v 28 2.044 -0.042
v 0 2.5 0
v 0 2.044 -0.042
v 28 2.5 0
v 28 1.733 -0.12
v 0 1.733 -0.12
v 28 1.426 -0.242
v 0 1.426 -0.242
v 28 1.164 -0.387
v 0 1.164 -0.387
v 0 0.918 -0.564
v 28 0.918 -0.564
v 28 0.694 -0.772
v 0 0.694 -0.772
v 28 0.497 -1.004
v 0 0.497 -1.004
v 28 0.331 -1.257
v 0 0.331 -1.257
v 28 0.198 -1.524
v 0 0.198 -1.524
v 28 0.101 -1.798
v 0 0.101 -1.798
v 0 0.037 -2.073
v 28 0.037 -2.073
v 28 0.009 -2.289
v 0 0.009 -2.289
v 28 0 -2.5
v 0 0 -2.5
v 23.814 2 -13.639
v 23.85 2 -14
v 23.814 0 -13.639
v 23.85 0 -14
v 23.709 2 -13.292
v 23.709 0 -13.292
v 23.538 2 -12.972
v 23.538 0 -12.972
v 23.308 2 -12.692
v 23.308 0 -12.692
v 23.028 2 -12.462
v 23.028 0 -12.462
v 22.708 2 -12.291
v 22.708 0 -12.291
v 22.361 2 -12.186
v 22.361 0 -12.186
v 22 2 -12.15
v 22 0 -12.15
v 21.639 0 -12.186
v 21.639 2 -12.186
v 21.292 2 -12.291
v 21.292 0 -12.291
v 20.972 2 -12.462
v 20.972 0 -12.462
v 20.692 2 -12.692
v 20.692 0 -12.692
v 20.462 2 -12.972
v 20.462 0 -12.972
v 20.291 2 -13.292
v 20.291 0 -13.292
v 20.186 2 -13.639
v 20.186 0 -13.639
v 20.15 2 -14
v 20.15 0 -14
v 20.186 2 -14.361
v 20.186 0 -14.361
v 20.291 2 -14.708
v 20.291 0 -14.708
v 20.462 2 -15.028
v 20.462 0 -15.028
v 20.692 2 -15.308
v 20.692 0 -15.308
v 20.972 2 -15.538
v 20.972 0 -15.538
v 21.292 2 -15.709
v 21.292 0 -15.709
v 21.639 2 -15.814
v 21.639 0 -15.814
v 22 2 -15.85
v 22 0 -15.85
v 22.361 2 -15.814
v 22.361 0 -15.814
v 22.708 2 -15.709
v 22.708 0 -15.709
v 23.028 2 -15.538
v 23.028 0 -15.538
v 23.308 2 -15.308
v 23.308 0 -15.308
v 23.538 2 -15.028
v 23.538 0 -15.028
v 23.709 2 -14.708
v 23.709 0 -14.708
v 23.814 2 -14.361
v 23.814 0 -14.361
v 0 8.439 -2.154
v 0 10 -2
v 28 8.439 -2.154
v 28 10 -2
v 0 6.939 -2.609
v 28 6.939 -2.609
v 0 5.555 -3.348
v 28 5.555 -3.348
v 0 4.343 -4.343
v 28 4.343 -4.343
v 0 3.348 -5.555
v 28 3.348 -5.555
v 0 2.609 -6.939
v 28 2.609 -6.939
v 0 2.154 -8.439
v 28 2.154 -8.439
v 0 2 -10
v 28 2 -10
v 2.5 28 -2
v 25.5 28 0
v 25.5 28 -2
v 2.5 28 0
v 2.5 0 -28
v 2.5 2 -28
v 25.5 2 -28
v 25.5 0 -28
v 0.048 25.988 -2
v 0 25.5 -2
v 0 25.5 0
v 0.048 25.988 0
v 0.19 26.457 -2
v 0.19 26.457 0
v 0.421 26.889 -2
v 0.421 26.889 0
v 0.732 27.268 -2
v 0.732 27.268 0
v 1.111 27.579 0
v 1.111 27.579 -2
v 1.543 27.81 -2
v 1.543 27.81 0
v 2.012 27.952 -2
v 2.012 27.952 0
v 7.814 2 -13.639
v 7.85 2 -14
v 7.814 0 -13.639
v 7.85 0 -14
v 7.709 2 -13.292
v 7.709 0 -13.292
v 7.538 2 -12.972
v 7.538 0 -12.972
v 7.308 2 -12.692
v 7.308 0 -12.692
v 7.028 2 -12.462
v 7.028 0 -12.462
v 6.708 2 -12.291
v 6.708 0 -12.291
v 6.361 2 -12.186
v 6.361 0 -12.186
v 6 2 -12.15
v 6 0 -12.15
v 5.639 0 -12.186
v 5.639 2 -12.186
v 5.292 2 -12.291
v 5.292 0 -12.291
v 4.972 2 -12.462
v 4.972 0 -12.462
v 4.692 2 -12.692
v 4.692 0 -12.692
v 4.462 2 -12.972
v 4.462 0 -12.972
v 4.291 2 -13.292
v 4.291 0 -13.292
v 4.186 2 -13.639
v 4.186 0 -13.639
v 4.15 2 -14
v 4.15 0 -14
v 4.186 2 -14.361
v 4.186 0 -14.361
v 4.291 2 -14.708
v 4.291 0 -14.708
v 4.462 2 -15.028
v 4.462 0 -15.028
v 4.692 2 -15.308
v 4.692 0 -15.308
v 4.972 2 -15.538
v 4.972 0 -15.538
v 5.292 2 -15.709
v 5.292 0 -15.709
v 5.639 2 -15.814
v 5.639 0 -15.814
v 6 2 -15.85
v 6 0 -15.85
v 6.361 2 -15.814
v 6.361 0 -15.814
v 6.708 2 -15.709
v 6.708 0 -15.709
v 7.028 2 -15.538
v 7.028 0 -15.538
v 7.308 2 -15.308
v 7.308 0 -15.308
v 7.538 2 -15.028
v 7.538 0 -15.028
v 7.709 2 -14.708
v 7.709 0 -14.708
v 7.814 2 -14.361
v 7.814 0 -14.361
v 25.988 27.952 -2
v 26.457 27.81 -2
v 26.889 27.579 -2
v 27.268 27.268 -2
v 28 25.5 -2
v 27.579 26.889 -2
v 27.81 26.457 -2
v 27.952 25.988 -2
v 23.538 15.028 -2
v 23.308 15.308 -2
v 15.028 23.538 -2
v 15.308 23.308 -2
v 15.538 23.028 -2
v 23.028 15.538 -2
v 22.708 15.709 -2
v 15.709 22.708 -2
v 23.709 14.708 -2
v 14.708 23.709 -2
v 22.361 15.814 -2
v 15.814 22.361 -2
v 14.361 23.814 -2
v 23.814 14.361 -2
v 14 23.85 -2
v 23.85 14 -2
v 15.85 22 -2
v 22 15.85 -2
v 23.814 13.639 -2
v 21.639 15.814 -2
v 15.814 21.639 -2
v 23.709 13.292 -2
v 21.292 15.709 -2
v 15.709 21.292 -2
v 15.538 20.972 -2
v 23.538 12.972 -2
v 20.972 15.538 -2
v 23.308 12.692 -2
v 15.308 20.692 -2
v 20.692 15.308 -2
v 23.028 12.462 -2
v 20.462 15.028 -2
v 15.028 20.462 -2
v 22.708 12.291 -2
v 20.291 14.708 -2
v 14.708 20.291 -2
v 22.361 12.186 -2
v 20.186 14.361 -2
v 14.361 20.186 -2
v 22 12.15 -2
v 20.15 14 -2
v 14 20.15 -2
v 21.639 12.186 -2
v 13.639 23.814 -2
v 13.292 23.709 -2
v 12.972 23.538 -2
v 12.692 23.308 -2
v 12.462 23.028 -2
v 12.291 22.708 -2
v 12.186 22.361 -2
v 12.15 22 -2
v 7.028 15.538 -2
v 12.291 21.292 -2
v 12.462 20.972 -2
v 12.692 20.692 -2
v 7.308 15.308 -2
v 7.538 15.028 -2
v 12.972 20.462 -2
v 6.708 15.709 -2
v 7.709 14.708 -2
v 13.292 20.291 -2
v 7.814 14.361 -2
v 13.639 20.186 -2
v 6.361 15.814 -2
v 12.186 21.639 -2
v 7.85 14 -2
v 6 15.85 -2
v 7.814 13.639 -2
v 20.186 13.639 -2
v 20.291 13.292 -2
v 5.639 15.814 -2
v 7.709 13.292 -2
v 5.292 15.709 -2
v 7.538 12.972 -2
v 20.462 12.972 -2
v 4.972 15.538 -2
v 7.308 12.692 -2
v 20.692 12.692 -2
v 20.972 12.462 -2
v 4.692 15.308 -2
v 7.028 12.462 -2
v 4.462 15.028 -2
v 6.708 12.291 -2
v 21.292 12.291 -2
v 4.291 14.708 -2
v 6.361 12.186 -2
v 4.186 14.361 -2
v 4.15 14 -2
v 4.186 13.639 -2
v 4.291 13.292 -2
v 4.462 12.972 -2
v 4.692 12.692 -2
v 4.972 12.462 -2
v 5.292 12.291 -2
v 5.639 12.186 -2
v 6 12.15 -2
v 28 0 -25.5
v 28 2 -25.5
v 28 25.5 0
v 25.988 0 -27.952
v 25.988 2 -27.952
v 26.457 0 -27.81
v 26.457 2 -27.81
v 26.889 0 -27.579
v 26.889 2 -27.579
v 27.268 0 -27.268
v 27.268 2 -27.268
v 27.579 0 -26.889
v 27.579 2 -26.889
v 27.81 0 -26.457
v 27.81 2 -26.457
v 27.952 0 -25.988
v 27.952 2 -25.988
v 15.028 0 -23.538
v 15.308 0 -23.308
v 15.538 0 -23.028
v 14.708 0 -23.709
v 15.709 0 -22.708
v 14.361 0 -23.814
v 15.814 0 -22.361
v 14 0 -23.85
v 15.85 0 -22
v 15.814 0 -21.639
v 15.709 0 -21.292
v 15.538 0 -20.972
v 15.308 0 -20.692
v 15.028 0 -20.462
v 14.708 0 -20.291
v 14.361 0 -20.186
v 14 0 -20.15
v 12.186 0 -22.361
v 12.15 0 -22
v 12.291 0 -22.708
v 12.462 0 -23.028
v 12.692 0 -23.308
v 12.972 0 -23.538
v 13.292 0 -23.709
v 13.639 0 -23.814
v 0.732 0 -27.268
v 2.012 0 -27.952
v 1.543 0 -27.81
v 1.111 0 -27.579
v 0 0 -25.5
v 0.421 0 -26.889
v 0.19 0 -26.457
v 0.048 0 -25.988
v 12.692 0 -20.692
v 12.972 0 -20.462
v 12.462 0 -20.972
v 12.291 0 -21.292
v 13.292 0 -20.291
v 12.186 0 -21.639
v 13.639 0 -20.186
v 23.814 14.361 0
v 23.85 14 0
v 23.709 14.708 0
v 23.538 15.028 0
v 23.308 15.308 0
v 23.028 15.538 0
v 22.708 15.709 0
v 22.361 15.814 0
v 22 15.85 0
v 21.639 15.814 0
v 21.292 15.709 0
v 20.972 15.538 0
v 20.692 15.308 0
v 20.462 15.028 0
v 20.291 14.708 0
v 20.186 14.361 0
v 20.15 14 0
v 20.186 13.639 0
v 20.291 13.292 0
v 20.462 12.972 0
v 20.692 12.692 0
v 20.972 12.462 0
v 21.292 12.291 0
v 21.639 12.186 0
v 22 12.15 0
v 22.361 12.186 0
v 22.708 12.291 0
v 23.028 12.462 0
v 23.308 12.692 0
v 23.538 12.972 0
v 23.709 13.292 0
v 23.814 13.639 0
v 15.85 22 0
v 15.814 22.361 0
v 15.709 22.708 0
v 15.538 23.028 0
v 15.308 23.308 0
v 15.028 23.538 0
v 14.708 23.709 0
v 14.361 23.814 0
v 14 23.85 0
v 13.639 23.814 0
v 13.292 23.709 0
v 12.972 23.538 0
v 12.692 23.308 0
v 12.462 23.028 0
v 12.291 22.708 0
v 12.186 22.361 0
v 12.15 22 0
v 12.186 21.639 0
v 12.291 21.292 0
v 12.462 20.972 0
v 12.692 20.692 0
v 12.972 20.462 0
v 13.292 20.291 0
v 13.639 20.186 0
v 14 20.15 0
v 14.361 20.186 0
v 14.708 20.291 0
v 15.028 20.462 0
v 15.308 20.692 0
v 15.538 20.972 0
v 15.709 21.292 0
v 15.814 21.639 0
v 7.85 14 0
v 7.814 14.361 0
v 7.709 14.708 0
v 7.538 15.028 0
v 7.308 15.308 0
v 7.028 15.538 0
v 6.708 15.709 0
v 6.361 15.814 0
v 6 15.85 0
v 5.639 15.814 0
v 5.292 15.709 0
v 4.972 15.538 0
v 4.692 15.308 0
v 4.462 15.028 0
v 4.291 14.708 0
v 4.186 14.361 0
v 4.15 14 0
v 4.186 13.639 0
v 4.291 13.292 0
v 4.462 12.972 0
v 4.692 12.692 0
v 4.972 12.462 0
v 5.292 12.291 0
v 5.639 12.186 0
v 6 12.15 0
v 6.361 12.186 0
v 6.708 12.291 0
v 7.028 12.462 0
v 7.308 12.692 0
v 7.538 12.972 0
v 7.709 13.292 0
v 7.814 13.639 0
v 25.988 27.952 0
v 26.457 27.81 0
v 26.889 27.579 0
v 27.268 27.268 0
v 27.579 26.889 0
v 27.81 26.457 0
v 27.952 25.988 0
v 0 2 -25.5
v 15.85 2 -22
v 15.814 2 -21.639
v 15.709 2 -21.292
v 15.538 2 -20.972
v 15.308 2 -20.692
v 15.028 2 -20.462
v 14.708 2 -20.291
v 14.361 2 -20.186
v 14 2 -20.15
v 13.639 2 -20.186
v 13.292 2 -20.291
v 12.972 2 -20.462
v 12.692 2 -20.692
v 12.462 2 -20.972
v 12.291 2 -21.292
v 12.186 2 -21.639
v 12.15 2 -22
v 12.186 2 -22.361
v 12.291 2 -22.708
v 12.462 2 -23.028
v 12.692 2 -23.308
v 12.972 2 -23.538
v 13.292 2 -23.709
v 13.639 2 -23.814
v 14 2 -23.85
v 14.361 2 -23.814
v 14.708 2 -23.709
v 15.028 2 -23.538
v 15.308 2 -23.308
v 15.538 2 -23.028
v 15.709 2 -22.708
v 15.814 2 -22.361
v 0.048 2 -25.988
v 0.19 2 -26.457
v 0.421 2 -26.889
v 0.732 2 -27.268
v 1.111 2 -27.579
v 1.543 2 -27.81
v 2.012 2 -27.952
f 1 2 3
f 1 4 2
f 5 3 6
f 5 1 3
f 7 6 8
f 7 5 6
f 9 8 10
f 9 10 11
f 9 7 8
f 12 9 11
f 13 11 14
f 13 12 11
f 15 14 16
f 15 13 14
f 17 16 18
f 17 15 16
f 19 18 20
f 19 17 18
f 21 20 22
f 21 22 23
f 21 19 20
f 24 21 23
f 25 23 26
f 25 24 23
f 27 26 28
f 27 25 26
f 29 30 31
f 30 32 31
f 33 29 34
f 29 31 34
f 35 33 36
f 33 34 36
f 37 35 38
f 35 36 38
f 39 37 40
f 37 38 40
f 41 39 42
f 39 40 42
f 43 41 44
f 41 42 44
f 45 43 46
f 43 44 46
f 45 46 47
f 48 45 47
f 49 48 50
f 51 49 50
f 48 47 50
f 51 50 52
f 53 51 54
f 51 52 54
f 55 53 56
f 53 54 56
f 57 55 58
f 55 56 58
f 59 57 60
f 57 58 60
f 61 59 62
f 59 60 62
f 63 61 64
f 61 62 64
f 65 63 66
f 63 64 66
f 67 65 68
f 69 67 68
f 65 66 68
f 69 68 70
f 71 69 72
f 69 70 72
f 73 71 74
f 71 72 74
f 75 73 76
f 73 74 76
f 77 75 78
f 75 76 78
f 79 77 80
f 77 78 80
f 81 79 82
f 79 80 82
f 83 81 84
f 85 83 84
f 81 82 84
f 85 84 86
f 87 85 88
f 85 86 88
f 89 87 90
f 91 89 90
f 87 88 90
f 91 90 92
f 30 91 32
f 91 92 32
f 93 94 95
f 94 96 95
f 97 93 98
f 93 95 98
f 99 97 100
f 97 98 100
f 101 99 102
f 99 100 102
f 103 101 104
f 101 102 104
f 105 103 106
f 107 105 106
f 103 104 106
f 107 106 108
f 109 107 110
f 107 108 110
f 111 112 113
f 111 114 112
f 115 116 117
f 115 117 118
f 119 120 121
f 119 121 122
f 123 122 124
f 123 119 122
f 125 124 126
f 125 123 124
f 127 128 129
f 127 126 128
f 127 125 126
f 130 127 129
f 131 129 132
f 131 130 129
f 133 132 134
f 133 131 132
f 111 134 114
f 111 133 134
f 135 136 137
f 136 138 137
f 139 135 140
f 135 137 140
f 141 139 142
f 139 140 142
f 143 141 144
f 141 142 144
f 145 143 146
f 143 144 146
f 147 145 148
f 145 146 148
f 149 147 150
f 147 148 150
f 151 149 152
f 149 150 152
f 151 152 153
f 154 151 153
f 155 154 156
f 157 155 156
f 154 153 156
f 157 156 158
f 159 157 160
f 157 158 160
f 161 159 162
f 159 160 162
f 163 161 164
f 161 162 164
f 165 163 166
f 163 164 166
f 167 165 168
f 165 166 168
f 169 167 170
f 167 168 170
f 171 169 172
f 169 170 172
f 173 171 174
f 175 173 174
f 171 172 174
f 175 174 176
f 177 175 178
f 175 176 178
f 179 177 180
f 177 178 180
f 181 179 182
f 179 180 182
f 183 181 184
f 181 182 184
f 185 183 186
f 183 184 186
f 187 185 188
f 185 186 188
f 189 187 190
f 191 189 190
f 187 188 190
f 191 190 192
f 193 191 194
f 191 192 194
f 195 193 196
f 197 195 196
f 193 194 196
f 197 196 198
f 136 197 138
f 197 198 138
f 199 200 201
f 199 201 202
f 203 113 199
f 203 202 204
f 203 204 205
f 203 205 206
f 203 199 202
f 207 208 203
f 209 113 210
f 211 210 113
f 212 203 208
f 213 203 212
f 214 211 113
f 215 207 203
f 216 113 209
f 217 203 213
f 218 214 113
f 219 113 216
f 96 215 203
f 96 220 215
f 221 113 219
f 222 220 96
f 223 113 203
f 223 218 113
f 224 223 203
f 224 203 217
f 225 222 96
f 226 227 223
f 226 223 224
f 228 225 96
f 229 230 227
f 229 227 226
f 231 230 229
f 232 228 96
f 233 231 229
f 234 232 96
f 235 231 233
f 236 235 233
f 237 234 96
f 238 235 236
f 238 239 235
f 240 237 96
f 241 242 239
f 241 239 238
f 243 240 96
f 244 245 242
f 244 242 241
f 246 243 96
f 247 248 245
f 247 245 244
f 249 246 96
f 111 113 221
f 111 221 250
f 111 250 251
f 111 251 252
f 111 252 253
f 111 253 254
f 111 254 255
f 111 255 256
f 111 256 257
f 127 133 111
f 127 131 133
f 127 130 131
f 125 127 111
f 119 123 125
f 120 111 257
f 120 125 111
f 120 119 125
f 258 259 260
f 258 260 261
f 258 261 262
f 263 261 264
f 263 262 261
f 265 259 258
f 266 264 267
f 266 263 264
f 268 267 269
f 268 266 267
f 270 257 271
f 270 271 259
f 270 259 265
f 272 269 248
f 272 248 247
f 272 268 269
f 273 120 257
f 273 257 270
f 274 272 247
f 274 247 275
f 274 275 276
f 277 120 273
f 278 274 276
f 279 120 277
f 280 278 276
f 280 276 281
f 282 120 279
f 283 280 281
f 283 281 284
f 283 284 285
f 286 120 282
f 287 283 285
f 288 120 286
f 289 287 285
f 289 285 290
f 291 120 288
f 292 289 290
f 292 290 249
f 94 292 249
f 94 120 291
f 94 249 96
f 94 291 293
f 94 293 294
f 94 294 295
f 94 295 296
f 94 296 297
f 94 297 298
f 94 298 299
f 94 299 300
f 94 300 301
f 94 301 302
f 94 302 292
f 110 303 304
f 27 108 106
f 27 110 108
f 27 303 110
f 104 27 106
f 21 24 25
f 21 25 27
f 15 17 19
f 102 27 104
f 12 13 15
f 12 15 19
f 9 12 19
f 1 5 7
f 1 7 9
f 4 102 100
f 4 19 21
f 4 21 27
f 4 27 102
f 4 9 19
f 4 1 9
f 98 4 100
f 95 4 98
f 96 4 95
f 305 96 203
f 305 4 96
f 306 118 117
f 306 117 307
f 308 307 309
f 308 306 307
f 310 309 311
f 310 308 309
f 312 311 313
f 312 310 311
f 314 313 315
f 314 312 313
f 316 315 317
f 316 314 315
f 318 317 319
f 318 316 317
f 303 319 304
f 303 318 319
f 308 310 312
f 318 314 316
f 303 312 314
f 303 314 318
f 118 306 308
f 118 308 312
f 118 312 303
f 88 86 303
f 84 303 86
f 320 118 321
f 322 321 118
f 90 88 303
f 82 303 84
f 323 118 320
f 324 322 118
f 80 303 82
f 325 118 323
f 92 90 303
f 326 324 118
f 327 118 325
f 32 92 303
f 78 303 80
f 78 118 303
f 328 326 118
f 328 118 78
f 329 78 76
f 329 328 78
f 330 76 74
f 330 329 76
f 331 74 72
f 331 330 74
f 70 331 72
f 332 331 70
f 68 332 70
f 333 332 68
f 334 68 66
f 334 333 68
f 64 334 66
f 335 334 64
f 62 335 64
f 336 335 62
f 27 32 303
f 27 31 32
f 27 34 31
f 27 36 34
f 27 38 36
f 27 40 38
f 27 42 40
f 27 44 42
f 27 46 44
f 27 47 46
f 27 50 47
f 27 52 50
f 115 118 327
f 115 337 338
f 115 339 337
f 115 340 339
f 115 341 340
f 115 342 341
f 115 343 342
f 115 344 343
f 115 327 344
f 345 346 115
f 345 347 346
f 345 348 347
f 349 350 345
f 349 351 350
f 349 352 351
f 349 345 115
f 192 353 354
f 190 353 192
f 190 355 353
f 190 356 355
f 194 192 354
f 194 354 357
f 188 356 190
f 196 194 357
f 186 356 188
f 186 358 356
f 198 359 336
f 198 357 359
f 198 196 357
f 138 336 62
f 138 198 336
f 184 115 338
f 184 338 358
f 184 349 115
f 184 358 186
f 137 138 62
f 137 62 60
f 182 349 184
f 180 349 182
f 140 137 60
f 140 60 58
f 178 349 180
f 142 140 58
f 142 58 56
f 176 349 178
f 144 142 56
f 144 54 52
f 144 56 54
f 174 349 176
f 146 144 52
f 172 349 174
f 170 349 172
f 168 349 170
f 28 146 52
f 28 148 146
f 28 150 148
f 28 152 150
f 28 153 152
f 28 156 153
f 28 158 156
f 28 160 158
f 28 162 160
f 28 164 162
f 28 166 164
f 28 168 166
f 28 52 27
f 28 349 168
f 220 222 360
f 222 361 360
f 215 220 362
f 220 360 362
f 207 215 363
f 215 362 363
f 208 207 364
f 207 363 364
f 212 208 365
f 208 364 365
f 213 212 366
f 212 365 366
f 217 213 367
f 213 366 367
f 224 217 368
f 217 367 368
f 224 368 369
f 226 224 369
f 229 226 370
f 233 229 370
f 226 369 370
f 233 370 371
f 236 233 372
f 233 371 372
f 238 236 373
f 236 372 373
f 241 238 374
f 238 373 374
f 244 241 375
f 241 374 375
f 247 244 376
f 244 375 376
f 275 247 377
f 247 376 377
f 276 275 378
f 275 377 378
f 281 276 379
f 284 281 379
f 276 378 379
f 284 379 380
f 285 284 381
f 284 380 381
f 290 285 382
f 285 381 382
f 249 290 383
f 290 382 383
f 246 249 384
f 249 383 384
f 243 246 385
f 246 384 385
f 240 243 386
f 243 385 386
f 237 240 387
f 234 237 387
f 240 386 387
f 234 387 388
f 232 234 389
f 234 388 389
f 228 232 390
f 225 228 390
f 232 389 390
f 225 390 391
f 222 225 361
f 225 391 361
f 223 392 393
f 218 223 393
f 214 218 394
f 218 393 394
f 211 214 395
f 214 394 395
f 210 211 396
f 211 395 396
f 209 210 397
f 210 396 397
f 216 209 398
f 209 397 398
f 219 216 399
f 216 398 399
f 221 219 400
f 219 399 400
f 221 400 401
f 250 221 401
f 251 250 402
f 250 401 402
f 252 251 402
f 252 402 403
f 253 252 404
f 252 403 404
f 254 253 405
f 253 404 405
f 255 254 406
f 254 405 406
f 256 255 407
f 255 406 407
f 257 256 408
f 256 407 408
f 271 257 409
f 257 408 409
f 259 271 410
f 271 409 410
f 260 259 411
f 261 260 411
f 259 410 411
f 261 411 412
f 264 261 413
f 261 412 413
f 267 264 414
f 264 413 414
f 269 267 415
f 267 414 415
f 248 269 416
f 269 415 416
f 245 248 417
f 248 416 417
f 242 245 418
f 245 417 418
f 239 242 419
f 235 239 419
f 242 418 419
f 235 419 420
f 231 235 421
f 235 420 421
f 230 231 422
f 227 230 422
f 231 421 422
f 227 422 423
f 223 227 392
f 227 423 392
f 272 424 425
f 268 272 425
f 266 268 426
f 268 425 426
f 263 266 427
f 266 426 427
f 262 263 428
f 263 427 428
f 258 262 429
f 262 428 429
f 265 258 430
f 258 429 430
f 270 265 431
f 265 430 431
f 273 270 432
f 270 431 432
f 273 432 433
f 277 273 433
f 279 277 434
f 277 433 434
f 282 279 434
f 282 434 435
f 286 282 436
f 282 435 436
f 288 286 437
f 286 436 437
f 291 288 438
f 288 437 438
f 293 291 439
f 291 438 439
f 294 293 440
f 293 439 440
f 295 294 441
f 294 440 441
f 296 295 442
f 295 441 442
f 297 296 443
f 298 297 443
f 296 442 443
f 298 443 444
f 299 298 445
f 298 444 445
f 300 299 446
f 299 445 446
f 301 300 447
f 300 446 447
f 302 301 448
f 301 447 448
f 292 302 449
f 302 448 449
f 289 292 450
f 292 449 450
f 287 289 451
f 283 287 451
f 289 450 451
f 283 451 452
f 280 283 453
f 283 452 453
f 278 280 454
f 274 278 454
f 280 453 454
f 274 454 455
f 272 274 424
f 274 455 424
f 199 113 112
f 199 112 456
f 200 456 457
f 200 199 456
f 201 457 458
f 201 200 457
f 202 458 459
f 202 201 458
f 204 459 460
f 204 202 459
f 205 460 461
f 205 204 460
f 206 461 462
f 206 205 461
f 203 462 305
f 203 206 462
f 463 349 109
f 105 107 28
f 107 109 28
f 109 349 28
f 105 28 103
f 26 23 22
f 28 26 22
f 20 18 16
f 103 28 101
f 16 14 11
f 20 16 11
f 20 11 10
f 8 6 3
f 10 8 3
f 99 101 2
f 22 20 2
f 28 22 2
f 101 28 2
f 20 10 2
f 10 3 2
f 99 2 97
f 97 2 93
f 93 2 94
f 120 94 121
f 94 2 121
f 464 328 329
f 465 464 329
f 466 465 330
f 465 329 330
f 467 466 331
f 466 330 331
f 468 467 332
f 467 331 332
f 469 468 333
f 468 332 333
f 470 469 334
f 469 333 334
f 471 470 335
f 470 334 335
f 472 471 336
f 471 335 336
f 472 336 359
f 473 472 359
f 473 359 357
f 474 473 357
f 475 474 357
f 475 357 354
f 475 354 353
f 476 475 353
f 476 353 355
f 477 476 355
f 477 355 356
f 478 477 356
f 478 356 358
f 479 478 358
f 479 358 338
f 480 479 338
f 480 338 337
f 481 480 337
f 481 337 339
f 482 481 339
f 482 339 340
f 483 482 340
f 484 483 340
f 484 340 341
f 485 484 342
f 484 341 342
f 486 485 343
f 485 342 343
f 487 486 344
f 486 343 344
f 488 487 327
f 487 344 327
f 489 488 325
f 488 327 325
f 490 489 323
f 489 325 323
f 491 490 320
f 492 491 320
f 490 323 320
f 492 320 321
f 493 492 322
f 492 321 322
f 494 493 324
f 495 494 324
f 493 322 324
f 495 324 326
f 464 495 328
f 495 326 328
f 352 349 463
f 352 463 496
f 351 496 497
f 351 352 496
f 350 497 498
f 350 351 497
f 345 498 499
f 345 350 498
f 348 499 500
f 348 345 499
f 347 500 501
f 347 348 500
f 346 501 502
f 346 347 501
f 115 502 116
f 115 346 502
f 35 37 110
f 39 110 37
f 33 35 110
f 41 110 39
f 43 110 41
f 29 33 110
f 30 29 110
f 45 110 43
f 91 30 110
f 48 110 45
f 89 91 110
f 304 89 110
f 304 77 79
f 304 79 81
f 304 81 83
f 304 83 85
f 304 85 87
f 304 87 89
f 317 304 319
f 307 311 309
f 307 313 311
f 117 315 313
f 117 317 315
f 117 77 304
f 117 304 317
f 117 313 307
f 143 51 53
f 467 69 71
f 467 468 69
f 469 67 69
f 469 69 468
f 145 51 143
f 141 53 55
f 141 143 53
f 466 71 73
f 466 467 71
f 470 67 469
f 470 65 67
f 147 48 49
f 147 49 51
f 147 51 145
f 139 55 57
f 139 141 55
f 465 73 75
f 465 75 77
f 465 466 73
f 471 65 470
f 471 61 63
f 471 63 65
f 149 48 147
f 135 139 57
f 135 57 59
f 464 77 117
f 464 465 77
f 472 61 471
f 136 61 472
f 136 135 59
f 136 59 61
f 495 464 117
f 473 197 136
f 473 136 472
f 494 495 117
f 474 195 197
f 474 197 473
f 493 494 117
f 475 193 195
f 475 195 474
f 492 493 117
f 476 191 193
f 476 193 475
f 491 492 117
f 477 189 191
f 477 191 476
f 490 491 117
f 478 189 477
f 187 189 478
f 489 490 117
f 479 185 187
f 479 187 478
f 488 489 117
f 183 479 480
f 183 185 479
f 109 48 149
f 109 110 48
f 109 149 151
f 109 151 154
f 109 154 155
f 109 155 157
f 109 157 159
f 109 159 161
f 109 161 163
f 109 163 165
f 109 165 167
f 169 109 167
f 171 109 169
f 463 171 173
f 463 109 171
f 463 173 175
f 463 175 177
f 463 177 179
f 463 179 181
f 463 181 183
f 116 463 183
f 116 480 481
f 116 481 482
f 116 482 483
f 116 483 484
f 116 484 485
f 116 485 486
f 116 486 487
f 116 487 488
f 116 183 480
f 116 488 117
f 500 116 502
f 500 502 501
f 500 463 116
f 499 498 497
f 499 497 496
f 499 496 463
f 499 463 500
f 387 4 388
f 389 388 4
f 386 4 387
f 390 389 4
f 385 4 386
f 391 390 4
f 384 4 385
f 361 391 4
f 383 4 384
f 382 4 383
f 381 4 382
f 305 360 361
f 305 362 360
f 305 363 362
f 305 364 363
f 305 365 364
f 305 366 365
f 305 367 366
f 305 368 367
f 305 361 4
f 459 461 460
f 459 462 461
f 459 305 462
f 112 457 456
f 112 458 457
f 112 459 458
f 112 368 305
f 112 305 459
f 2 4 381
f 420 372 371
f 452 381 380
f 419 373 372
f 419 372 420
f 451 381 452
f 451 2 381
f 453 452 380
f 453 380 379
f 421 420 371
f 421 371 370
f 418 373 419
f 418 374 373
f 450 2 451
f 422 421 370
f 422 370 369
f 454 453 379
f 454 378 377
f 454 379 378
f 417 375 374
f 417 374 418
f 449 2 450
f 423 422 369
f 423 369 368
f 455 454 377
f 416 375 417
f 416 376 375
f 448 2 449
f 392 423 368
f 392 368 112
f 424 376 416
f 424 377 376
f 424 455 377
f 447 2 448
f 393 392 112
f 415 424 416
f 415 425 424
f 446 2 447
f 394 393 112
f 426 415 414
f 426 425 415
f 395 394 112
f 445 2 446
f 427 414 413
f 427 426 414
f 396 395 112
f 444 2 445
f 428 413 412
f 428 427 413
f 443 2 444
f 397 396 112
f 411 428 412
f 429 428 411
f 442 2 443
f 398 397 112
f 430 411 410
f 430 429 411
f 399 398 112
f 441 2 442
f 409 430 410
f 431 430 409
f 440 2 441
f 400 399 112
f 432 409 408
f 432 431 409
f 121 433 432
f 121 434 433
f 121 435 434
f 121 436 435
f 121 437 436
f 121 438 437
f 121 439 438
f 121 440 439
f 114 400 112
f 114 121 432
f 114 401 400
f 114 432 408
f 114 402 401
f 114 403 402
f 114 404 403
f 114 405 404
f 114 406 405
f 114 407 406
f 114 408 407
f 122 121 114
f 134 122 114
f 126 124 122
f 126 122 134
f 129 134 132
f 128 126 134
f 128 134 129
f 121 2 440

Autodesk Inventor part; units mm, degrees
ref_plane "YZ Plane" through (0, 0, 0) normal (1, 0, 0) x (0, 1, 0)
ref_plane "XZ Plane" through (0, 0, 0) normal (0, 1, 0) x (-1, 0, 0)
ref_plane "XY Plane" through (0, 0, 0) normal (0, 0, 1) x (1, 0, 0)
sketch "Sketch1" plane through (0, 0, 0) normal (1, 0, 0) x (0, 1, 0)
  line L0 (0, 0) -> (28, 0)
  line L1 (28, 0) -> (28, -2)
  line L2 (0, -2) -> (0, 0)
  line L3 (0, 0) -> (2, 0)
  line L4 (2, -28) -> (0, -28)
  line L5 (0, -28) -> (0, 0)
  line L6 (28, -2) -> (2, -2)
  line L7 (2, -2) -> (2, -28)
  dimension "d0" = 28
  dimension "d1" = 2
  dimension "d2" = 2
  dimension "d3" = 28
extrude "Extrusion1" add sketch "Sketch1" along normal blind 28
fillet "Fillet1" radius 2.5 5 edges at (28, 28, -1) (0, 28, -1) (28, 1, -28) (0, 1, -28) (14, 0, 0)
fillet "Fillet1" radius 8 1 edges at (14, 2, -2)
sketch "Sketch2" plane through (0, 2.5, 0) normal (0, 0, 1) x (1, 0, 0)
  circle A0 centre (14, 19.5) radius 1.85
  circle A1 centre (6, 11.5) radius 1.85
  circle A2 centre (22, 11.5) radius 1.85
  point P0 (0, -2.5)
extrude "Extrusion2" cut sketch "Sketch2" against normal through all
sketch "Sketch3" plane through (0, 0, -25.5) normal (0, -1, 0) x (1, 0, 0)
  circle A0 centre (6, 11.5) radius 1.85
  circle A1 centre (14, 3.5) radius 1.85
  circle A2 centre (22, 11.5) radius 1.85
  point P0 (0, 25.5)
extrude "Extrusion3" cut sketch "Sketch3" against normal through all
properties part number "sideplatemount"
